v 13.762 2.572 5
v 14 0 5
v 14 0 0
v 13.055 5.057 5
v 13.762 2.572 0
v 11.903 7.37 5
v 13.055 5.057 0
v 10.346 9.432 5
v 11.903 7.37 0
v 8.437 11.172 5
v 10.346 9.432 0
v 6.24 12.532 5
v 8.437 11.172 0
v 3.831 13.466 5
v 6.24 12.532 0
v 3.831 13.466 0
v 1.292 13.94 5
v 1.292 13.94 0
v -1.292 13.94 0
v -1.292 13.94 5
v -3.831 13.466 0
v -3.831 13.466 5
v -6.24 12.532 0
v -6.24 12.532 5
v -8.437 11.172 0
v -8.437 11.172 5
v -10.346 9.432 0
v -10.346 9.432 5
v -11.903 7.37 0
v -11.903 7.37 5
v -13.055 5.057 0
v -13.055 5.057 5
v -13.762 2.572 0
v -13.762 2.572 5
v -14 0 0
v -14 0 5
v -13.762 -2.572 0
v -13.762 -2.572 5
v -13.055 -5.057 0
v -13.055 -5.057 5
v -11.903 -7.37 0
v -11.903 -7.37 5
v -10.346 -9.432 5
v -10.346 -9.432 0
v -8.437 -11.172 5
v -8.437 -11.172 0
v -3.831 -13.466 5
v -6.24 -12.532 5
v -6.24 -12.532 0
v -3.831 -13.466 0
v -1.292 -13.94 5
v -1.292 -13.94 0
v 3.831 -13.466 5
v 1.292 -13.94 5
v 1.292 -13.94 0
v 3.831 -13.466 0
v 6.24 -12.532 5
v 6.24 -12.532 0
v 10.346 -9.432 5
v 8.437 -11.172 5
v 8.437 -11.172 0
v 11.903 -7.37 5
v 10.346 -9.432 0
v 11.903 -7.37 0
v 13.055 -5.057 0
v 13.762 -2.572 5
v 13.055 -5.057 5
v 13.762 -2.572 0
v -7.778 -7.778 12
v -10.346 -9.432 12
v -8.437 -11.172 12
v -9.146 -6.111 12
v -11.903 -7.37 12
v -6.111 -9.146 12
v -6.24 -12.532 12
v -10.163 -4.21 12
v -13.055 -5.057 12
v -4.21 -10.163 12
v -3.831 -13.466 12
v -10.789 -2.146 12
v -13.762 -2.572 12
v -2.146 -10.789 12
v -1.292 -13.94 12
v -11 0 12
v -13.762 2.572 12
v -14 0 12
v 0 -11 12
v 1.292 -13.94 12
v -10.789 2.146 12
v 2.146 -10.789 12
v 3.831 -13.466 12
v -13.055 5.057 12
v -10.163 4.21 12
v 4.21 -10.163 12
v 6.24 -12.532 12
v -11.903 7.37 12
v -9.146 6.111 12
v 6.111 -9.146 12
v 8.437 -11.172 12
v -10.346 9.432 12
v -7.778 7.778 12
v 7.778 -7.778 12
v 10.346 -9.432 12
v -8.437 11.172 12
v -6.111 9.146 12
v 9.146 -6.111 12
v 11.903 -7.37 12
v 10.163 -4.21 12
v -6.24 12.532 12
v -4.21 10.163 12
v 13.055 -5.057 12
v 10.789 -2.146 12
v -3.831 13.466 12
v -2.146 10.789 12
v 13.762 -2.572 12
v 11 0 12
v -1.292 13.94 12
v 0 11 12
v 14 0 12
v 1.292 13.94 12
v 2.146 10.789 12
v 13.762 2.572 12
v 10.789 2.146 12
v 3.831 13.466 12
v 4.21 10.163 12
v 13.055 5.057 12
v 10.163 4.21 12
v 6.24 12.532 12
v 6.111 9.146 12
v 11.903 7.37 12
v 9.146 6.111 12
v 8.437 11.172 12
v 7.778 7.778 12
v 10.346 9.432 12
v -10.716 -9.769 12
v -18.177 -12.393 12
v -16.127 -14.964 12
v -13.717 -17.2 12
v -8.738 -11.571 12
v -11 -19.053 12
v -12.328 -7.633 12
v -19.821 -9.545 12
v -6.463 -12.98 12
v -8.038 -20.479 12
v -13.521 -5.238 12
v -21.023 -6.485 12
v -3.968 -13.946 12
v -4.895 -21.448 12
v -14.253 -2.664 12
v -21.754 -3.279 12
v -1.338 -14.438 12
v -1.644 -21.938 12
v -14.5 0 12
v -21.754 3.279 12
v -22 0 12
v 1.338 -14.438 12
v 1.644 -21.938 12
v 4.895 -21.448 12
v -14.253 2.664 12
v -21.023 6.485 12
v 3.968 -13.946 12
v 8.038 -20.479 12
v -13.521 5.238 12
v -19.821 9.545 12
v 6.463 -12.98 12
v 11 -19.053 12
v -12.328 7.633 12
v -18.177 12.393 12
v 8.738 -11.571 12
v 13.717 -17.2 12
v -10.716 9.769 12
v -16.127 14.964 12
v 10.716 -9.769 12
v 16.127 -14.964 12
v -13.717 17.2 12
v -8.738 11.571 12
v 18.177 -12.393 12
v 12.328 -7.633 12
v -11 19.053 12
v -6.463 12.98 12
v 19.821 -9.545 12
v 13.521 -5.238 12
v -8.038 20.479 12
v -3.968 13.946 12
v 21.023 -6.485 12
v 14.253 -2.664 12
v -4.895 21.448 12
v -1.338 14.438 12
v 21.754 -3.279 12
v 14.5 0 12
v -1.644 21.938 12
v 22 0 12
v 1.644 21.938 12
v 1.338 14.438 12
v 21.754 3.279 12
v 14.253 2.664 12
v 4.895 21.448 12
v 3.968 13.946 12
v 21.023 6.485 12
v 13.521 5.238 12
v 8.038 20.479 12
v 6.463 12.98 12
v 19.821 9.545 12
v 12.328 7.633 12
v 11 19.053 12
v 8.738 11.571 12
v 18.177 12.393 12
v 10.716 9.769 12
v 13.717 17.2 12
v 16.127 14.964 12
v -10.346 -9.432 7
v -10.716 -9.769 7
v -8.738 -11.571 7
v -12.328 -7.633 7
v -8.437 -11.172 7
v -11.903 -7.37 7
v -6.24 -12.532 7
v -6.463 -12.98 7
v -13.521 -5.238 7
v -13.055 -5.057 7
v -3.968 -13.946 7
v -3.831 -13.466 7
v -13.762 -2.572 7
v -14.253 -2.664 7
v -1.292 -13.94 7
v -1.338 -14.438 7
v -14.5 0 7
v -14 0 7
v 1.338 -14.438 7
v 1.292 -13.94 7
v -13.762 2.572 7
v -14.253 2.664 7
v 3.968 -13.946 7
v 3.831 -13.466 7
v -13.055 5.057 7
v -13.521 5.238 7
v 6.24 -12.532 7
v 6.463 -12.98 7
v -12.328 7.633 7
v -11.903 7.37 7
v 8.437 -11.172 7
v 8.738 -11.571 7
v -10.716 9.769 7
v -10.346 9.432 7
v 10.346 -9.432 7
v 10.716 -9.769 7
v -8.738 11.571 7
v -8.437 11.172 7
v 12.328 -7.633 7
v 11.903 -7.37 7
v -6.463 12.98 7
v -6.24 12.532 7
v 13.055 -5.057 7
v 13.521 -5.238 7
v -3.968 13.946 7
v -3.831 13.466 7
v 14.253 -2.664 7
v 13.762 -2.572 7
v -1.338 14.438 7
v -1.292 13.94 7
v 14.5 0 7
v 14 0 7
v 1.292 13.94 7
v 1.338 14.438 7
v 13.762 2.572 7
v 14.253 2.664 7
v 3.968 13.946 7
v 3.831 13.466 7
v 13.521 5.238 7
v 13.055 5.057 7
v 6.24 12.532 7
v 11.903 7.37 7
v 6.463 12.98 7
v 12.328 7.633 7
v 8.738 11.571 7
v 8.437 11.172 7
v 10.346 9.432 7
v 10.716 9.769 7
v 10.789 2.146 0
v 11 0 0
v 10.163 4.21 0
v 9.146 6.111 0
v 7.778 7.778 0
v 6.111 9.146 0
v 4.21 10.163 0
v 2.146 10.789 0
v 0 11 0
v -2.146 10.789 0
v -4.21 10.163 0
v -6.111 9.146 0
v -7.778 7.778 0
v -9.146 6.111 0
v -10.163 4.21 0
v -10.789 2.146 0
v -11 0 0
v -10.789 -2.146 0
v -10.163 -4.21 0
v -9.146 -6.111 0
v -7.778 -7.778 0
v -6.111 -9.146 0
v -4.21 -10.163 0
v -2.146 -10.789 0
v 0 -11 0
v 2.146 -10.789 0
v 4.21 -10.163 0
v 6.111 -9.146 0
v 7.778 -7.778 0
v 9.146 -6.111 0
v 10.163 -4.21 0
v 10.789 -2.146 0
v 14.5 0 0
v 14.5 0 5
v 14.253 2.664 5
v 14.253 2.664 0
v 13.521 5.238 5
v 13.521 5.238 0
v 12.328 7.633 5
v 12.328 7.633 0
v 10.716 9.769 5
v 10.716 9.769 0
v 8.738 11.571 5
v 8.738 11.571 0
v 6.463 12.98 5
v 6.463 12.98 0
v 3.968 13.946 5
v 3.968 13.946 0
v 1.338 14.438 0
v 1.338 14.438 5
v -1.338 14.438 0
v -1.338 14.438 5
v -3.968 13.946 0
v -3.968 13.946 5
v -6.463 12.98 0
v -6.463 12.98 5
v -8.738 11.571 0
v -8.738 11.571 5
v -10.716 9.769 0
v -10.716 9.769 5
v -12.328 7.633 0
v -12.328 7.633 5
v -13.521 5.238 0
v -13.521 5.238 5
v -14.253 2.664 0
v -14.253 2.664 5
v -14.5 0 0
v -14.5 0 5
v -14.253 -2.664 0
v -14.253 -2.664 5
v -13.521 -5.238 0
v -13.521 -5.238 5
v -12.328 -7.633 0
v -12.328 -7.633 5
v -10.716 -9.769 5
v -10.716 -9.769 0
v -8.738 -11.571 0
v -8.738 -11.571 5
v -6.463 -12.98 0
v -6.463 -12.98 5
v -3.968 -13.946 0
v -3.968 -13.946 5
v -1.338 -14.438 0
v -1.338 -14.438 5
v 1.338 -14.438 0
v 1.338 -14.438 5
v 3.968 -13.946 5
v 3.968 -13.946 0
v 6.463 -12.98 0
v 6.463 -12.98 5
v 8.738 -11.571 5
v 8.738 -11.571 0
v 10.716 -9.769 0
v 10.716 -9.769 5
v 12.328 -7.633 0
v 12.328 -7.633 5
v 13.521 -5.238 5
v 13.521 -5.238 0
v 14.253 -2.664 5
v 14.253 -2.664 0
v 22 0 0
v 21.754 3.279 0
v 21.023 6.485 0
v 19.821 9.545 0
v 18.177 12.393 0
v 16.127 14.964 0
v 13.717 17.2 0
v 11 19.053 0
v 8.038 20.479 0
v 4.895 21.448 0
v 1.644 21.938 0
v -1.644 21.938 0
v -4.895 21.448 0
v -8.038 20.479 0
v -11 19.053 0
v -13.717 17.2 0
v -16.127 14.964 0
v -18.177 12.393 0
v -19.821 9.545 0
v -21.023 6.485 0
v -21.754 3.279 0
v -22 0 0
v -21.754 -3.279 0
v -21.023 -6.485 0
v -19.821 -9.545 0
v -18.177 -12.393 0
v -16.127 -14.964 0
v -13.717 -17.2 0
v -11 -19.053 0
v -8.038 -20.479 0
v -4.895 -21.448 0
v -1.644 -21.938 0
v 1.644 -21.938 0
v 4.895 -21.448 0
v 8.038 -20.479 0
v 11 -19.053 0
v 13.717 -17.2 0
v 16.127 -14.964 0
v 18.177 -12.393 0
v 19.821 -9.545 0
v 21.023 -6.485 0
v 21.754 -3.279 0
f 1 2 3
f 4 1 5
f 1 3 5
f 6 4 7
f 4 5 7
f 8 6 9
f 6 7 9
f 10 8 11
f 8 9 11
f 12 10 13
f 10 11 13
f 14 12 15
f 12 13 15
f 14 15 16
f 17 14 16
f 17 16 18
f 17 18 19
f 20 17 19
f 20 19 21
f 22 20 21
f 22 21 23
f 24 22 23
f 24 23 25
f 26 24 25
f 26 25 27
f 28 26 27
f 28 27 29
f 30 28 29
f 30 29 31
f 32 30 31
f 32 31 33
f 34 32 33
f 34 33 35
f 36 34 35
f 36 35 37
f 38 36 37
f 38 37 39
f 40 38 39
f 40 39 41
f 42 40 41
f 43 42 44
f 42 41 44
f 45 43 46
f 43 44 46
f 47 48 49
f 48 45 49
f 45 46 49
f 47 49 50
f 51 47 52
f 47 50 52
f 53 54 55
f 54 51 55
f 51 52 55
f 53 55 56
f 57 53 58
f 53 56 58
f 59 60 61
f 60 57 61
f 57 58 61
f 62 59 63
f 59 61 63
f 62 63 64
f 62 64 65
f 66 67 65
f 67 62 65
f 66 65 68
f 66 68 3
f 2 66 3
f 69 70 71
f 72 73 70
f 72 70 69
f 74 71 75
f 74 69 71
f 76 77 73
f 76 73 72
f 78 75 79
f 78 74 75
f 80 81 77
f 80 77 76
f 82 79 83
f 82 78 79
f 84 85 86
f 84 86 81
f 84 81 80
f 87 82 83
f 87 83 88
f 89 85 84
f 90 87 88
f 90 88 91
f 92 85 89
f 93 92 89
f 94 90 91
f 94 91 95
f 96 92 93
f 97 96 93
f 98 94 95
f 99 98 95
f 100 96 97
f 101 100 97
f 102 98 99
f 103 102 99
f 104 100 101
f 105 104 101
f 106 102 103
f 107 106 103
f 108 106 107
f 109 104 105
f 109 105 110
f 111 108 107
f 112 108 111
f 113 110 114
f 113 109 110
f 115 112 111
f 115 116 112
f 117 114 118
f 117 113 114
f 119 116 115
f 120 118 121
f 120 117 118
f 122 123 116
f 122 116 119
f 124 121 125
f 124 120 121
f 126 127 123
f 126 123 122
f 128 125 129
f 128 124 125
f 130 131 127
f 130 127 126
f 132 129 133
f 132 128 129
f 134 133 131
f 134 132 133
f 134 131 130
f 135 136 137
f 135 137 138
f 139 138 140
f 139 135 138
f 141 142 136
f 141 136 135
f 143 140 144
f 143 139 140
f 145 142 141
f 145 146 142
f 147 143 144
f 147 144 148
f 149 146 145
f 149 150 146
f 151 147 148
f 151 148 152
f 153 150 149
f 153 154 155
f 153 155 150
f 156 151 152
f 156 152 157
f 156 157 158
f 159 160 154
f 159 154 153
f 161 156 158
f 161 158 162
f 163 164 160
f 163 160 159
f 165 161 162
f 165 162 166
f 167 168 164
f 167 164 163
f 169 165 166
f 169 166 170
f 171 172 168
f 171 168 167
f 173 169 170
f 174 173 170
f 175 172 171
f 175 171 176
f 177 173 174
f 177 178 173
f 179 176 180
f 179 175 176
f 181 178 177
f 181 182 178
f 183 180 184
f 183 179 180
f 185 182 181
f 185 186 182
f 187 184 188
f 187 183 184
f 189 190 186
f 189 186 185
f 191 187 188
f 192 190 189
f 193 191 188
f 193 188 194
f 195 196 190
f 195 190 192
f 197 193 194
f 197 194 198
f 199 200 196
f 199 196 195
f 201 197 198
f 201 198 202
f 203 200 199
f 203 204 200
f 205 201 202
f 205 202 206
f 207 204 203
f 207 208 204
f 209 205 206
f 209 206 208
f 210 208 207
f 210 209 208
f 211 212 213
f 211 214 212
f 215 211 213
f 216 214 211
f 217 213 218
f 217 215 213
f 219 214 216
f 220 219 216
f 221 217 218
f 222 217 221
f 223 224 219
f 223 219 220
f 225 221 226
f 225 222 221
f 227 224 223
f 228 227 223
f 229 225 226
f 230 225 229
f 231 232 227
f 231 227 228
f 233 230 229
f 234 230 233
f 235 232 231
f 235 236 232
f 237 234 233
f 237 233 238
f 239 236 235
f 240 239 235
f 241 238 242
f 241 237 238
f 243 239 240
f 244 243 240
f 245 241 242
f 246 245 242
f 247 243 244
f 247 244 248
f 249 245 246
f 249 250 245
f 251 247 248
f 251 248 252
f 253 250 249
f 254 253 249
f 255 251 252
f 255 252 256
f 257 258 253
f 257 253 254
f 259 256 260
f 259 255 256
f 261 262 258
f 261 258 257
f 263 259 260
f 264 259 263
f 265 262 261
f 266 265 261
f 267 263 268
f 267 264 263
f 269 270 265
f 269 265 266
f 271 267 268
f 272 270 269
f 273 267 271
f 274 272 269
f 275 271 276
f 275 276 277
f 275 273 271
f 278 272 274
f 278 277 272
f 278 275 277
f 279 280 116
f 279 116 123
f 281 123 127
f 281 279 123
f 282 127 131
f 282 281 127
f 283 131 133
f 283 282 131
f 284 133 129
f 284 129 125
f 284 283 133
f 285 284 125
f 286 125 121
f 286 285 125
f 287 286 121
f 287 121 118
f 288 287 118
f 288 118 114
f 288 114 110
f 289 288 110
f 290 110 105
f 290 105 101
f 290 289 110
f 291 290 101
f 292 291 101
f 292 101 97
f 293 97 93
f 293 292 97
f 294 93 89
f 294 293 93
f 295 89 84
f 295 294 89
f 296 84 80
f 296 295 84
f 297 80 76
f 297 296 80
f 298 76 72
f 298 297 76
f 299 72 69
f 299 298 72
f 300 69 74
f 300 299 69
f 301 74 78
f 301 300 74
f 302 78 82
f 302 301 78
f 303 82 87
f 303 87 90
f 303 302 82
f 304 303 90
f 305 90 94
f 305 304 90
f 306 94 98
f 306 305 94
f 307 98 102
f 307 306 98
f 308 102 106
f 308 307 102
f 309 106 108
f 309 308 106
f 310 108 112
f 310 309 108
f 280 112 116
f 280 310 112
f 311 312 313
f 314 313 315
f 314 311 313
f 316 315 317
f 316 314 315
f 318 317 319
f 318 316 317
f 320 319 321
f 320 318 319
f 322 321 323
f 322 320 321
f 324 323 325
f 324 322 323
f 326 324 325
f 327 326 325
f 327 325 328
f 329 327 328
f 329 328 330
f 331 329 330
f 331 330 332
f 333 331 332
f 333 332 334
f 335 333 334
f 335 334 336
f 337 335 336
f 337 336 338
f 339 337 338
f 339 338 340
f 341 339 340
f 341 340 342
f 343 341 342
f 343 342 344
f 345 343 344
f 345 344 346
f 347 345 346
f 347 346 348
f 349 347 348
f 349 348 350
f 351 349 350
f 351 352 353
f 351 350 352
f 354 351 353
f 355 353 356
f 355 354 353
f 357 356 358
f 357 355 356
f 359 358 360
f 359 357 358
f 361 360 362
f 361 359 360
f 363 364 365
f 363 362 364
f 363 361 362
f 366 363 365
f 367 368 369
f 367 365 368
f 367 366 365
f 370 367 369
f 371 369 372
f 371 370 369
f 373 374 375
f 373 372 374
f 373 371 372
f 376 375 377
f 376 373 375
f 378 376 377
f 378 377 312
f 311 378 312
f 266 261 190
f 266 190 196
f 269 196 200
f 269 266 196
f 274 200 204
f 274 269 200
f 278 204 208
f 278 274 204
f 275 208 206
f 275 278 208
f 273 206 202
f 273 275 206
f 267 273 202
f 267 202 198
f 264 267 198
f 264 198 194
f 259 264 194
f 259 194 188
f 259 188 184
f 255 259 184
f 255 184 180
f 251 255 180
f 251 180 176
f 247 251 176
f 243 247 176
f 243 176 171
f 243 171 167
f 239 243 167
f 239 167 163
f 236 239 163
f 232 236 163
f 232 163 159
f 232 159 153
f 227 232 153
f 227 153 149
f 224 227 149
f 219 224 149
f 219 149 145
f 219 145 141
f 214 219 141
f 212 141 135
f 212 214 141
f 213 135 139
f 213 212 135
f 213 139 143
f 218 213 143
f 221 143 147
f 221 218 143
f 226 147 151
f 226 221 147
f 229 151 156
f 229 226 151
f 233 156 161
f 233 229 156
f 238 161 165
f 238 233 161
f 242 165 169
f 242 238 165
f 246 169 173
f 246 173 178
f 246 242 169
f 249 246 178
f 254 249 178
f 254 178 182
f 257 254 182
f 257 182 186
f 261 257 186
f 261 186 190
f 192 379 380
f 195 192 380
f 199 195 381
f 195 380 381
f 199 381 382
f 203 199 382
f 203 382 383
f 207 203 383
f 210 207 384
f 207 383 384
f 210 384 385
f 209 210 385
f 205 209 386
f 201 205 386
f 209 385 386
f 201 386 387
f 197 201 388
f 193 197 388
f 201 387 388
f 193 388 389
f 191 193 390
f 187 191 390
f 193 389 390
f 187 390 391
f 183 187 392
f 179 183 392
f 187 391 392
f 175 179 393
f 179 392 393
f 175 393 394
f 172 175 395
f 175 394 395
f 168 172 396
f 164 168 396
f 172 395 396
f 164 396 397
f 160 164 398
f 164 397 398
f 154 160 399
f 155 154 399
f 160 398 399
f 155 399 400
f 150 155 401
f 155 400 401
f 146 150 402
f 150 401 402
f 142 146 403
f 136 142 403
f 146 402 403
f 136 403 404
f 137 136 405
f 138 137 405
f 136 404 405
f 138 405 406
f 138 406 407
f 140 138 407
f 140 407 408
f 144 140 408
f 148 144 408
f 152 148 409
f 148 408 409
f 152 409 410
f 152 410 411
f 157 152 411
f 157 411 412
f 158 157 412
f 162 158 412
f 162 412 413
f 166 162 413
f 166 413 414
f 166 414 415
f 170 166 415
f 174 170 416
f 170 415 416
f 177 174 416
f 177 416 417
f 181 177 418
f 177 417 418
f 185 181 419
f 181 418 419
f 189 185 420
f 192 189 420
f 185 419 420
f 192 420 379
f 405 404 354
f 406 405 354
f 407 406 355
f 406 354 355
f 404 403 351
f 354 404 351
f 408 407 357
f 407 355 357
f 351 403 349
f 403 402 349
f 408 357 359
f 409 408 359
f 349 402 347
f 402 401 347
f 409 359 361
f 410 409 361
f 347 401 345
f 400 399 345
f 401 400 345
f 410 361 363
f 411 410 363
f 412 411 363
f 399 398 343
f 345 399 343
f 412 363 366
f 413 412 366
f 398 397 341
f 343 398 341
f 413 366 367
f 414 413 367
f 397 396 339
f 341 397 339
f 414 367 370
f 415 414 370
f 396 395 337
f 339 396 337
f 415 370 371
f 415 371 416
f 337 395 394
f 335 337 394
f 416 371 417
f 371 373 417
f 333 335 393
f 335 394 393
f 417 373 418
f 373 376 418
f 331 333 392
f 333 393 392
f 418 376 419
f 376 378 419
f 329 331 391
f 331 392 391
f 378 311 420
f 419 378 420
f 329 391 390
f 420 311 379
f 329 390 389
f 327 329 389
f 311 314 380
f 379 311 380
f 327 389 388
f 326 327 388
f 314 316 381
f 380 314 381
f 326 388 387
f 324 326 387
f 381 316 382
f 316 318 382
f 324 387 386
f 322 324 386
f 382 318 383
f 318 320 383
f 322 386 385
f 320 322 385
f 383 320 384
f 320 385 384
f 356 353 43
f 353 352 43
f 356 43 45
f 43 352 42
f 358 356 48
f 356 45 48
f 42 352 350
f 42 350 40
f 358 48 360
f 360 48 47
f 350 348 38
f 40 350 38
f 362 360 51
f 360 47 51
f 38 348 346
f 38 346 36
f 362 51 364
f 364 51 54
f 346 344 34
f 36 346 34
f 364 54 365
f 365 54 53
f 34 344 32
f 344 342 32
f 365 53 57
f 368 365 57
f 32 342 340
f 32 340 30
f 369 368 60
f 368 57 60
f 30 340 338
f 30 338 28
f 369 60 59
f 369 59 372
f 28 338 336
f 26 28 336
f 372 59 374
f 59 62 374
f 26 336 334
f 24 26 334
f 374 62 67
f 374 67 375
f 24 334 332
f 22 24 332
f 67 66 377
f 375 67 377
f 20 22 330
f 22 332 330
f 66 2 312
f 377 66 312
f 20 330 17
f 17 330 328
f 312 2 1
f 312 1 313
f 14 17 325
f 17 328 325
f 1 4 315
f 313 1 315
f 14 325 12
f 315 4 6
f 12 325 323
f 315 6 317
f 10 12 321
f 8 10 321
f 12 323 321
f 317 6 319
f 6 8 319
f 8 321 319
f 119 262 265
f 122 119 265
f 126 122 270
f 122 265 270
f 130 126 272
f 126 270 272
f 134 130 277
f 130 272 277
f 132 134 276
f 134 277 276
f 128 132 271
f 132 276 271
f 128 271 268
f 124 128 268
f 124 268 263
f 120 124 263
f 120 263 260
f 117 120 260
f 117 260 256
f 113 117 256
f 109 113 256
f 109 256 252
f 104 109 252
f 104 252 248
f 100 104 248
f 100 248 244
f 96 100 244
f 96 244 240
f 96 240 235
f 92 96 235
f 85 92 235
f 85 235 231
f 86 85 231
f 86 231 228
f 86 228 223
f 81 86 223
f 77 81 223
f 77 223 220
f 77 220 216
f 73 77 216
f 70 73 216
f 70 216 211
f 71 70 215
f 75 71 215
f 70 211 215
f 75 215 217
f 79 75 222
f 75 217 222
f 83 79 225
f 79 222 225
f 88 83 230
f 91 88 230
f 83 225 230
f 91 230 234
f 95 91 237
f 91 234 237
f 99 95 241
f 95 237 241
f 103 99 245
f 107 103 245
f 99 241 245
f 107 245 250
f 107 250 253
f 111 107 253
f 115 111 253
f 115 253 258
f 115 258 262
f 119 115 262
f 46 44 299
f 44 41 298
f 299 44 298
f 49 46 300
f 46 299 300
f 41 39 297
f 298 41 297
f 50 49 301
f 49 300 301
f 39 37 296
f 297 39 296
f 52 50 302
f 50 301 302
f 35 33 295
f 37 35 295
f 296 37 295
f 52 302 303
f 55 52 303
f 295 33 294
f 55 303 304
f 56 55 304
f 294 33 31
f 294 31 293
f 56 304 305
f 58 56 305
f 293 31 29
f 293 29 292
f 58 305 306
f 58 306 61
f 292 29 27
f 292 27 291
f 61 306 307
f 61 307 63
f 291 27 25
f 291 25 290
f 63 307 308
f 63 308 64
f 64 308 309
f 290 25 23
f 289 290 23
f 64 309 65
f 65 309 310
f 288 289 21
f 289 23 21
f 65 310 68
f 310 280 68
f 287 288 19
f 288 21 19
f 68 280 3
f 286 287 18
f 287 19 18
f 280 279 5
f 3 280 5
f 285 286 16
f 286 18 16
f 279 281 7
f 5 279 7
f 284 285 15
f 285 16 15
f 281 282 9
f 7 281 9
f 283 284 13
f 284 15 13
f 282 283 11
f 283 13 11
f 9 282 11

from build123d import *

# Parameters (mm, degrees)
F1_R          = 14
F1_R_2        = 11
F2_DEPTH      = 12
F1_R_3        = 22
F1_R_4        = 14.5
F4_R          = 18.25
F4_R_2        = 12.5
F5_DEPTH      = 1
F5_DEPTH_BACK = 1


with BuildPart() as f2:
    # F1 (on Top) → F2 (new body)
    with BuildSketch(Plane.XY):
        Circle(F1_R)
        Circle(F1_R_2, mode=Mode.SUBTRACT)
    extrude(amount=F2_DEPTH)



with BuildPart() as f2b:
    # F1 (on Top) → F2, piece 2 (new body)
    with BuildSketch(Plane.XY):
        Circle(F1_R_3)
        Circle(F1_R_4, mode=Mode.SUBTRACT)
    extrude(amount=F2_DEPTH)


with BuildPart() as f2_1:
    add(f2.part)

    add(f2b.part)  # F5 merges F2b
    # F4 (on mid) → F5 (join, two sides)
    with BuildSketch(Plane.XY.offset(6)) as f5_sk:
        Circle(F4_R)
        Circle(F4_R_2, mode=Mode.SUBTRACT)
    extrude(amount=F5_DEPTH)
    extrude(f5_sk.sketch, amount=-F5_DEPTH_BACK)


solid = f2_1.part
